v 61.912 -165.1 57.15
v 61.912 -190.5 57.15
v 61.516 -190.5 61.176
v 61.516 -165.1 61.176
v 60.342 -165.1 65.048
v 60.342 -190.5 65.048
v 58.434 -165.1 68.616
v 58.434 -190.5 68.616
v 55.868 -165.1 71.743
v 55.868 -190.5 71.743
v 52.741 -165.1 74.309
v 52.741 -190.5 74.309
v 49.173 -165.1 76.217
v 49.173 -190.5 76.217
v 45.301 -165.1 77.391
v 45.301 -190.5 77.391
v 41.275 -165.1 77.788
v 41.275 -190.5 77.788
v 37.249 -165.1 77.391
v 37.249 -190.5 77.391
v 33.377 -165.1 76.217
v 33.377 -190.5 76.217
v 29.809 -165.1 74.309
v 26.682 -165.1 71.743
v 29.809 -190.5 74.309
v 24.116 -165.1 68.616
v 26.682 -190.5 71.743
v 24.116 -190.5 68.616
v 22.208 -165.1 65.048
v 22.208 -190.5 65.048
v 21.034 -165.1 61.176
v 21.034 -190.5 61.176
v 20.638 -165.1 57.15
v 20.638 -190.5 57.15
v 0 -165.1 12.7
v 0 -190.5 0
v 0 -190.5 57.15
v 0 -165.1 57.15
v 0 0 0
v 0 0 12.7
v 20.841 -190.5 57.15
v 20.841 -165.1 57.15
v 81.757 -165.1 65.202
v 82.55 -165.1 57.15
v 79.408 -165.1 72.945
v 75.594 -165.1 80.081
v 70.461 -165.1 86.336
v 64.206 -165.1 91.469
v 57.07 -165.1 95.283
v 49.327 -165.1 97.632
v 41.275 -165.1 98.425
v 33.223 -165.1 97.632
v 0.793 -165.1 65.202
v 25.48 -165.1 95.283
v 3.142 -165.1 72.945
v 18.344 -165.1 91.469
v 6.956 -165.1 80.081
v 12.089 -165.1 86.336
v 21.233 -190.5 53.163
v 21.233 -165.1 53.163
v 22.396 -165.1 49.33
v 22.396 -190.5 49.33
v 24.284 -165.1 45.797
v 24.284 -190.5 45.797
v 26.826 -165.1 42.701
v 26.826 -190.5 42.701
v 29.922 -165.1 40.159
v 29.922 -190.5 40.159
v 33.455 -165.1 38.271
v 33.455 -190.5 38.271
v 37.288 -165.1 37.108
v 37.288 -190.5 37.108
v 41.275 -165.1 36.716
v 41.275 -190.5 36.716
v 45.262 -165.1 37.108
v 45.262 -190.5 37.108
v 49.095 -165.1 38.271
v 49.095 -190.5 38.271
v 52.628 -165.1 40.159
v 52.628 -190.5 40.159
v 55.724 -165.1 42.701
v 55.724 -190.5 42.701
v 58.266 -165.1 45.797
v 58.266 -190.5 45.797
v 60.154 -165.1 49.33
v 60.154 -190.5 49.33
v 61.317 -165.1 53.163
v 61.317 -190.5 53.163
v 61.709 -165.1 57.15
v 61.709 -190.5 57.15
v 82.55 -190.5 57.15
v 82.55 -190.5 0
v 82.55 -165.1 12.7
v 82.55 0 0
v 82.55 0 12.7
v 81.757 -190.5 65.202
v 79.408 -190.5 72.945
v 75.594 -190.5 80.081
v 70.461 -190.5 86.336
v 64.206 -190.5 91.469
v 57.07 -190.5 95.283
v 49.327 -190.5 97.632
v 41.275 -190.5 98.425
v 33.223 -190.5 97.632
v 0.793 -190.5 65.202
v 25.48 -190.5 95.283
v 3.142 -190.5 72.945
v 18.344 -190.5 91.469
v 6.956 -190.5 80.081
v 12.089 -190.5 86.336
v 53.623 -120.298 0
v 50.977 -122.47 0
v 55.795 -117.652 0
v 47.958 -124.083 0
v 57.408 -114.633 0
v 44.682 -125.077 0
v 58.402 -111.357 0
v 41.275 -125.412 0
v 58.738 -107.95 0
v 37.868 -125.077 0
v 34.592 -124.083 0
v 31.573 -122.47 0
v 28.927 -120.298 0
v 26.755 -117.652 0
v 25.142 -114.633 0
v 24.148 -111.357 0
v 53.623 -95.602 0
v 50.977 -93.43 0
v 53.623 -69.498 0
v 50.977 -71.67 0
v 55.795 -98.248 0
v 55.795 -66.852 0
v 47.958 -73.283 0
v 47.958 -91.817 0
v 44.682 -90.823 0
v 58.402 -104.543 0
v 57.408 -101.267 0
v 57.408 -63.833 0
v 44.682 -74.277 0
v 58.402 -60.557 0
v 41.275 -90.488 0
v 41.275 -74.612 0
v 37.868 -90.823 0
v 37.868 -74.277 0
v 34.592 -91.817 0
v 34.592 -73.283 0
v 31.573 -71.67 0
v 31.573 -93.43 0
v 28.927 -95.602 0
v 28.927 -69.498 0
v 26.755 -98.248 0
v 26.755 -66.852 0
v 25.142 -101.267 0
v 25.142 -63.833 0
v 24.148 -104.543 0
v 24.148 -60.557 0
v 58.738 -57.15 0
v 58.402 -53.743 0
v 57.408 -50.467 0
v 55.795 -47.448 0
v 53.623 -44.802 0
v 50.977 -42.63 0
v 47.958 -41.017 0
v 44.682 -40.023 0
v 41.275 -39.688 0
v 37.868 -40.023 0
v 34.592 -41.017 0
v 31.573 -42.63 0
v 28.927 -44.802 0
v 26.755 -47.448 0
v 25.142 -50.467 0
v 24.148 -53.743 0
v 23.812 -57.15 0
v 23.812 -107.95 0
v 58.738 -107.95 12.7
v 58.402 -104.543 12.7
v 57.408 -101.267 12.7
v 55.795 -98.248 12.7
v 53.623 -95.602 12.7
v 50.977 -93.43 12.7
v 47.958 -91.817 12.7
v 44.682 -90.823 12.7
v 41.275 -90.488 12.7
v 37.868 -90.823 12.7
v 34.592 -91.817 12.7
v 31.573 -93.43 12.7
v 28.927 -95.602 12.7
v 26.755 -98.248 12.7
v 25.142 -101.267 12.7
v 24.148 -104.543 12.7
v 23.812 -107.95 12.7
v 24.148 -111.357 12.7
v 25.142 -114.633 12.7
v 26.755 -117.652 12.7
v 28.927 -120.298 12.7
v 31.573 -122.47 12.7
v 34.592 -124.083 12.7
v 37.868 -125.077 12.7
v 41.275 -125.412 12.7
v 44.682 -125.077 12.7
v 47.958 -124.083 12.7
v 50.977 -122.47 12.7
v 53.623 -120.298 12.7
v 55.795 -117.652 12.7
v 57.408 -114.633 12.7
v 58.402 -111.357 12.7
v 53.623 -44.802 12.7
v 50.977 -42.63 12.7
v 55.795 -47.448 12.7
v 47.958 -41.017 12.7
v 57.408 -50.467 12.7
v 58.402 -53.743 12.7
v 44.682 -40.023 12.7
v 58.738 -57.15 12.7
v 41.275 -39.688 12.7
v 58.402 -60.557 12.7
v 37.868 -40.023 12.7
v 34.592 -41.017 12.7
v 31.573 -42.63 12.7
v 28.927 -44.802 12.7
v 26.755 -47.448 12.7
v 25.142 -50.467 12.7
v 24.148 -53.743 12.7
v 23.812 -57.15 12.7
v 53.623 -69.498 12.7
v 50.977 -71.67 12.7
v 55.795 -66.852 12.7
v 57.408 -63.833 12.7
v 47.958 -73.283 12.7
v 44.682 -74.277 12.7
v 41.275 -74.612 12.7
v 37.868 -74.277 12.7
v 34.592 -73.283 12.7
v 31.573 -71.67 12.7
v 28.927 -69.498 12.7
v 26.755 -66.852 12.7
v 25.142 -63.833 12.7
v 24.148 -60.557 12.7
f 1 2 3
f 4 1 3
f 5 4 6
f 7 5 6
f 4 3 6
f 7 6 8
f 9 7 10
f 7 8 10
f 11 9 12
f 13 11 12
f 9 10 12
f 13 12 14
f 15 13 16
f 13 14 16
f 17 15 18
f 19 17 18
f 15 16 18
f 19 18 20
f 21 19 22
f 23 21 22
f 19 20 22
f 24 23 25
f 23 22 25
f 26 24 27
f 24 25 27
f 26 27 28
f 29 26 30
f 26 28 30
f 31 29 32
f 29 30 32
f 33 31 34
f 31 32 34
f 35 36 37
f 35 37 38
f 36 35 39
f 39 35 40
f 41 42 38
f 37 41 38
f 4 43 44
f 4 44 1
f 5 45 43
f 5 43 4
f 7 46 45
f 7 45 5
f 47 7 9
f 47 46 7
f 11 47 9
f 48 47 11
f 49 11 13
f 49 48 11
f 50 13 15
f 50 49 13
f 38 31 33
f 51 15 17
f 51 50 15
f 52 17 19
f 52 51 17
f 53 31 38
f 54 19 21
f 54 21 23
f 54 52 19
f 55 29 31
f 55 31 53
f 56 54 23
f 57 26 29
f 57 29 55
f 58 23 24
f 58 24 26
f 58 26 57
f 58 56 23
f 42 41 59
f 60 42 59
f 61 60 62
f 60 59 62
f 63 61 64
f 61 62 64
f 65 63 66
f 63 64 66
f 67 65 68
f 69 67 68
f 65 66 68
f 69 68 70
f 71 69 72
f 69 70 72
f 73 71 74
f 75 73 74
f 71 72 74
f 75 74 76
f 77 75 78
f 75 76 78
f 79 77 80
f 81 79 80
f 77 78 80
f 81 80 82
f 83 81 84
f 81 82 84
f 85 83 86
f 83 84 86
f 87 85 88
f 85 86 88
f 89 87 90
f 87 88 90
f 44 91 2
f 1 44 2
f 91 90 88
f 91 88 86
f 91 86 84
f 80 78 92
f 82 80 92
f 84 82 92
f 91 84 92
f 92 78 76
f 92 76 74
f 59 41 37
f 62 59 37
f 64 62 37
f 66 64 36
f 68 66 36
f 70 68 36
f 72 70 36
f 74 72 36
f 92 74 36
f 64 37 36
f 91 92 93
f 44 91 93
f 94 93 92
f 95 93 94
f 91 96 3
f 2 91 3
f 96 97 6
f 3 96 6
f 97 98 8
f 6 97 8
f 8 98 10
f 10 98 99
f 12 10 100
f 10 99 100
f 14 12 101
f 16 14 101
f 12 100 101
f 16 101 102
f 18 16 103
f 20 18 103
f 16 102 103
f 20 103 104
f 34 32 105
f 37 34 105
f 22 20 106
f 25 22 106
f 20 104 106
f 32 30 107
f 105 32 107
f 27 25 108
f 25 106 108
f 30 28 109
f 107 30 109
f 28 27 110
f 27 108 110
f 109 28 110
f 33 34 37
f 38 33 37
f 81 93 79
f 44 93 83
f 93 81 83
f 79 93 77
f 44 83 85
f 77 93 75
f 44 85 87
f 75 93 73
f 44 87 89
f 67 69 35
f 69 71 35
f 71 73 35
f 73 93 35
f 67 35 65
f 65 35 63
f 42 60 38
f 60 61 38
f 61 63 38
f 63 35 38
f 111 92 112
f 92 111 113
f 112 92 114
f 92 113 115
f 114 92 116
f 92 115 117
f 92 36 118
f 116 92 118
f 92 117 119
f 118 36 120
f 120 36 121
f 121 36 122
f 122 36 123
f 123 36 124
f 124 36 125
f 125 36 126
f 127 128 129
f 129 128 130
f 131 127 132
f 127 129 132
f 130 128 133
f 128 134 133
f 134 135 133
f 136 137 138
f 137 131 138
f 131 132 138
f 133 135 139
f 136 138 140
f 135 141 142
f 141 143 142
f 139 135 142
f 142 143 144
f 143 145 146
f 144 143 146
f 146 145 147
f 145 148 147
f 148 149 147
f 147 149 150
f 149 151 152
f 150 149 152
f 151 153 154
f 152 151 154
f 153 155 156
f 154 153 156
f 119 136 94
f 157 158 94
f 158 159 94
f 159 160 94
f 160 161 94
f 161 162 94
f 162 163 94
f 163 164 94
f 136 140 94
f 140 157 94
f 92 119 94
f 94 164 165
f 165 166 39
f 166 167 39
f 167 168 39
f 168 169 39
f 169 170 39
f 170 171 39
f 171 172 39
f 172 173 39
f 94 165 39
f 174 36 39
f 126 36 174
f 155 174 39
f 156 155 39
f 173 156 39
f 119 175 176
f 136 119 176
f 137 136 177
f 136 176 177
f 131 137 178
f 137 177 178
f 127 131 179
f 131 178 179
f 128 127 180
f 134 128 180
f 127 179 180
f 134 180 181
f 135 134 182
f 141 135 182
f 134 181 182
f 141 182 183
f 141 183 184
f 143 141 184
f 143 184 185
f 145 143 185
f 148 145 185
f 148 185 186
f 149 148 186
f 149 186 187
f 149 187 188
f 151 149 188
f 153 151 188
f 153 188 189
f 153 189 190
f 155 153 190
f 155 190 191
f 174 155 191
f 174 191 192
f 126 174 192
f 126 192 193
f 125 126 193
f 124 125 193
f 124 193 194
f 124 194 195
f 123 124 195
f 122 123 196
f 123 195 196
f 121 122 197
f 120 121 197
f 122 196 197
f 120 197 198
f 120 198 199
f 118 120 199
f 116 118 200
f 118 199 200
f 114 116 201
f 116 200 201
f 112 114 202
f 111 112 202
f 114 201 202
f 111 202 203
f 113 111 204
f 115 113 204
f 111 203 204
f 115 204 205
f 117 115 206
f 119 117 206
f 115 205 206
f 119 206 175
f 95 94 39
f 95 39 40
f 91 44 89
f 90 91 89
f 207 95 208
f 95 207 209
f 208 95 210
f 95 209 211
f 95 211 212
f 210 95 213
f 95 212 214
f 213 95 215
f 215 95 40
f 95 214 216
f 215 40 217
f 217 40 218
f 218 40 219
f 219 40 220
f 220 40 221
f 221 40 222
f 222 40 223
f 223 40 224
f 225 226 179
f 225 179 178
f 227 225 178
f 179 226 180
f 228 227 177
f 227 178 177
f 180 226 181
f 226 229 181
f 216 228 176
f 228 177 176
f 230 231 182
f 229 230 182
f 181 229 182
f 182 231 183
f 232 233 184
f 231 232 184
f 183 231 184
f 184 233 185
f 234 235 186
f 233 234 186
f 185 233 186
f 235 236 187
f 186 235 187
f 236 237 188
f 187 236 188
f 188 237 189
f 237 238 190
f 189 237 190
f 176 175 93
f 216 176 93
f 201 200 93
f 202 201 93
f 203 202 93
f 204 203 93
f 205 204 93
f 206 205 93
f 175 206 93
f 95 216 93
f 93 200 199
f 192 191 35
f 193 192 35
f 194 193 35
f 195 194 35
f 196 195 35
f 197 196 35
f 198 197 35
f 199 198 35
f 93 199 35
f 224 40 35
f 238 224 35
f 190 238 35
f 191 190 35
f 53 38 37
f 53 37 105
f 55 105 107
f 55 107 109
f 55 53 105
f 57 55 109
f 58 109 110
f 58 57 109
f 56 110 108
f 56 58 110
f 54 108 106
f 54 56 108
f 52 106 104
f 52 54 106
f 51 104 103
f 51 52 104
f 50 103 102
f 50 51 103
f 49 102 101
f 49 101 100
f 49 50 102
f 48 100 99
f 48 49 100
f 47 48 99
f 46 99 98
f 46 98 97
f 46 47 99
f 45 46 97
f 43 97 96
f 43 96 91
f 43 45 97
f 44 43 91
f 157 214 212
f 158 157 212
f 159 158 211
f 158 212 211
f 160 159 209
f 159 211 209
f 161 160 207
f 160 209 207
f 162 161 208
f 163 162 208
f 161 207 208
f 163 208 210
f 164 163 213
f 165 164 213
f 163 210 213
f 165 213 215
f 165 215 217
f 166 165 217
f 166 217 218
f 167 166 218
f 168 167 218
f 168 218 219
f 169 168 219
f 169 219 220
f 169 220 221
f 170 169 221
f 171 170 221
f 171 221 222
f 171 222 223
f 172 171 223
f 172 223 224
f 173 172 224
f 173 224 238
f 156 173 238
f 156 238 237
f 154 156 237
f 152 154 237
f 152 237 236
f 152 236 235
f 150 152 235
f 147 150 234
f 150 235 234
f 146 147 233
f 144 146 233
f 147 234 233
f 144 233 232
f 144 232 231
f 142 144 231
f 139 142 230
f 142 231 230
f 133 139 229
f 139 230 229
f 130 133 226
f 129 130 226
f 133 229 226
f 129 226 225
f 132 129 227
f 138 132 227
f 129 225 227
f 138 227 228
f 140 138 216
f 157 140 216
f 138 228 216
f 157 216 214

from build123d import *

# Parameters (mm, degrees)
F1_DEPTH  = 82.55
F2_R      = 17.4625
F3_DEPTH  = 12.701
F4_W      = 82.55
F4_H      = 44.45
F5_DEPTH  = 25.401
F7_DEPTH  = 25.4
F8_R      = 20.6375
F9_DEPTH  = 190.501
F10_R     = 20.4344731727
F11_DEPTH = 25.4


with BuildPart() as f1:
    # F0 (on Right) → F1 (new body)
    with BuildSketch(Plane.YZ):
        Polygon((-190.5, 0), (0, 0), (0, 12.7), (-165.1, 12.7), (-165.1, 101.6), (-190.5, 101.6), align=None)
    extrude(amount=F1_DEPTH)

    # F2 (on face) → F3 (cut, through all)
    with BuildSketch(Plane.XY.offset(12.7)):
        with Locations((41.275, -57.15)):
            Circle(F2_R)
        with Locations((41.275, -107.95)):
            Circle(F2_R)
    extrude(amount=-F3_DEPTH, mode=Mode.SUBTRACT)

    # F4 (on face) → F5 (cut, through all)
    with BuildSketch(Plane(origin=(0, -165.1, 0), x_dir=(-1, 0, 0), z_dir=(0, 1, 0))):
        with Locations((-41.275, 79.375)):
            Rectangle(F4_W, F4_H)
    extrude(amount=-F5_DEPTH, mode=Mode.SUBTRACT)

    # F10 (on face) → F11 (cut)
    with BuildSketch(Plane.XZ.offset(190.5)):
        with Locations((41.275, 57.15)):
            Circle(F10_R)
    extrude(amount=-F11_DEPTH, mode=Mode.SUBTRACT)


with BuildPart() as f7:
    # F6 (on face) → F7 (new body)
    with BuildSketch(Plane(origin=(0, -165.1, 0), x_dir=(-1, 0, 0), z_dir=(0, 1, 0))):
        with BuildLine():
            Line((-82.55, 57.15), (0, 57.15))
            ThreePointArc((0, 57.15), (-41.275, 98.425), (-82.55, 57.15))
        make_face()
    extrude(amount=-F7_DEPTH)

    # F8 (on face) → F9 (cut, through all)
    with BuildSketch(Plane.XZ.offset(190.5)):
        with Locations((41.275, 57.15)):
            Circle(F8_R)
    extrude(amount=-F9_DEPTH, mode=Mode.SUBTRACT)


solid = Compound([f1.part, f7.part])
